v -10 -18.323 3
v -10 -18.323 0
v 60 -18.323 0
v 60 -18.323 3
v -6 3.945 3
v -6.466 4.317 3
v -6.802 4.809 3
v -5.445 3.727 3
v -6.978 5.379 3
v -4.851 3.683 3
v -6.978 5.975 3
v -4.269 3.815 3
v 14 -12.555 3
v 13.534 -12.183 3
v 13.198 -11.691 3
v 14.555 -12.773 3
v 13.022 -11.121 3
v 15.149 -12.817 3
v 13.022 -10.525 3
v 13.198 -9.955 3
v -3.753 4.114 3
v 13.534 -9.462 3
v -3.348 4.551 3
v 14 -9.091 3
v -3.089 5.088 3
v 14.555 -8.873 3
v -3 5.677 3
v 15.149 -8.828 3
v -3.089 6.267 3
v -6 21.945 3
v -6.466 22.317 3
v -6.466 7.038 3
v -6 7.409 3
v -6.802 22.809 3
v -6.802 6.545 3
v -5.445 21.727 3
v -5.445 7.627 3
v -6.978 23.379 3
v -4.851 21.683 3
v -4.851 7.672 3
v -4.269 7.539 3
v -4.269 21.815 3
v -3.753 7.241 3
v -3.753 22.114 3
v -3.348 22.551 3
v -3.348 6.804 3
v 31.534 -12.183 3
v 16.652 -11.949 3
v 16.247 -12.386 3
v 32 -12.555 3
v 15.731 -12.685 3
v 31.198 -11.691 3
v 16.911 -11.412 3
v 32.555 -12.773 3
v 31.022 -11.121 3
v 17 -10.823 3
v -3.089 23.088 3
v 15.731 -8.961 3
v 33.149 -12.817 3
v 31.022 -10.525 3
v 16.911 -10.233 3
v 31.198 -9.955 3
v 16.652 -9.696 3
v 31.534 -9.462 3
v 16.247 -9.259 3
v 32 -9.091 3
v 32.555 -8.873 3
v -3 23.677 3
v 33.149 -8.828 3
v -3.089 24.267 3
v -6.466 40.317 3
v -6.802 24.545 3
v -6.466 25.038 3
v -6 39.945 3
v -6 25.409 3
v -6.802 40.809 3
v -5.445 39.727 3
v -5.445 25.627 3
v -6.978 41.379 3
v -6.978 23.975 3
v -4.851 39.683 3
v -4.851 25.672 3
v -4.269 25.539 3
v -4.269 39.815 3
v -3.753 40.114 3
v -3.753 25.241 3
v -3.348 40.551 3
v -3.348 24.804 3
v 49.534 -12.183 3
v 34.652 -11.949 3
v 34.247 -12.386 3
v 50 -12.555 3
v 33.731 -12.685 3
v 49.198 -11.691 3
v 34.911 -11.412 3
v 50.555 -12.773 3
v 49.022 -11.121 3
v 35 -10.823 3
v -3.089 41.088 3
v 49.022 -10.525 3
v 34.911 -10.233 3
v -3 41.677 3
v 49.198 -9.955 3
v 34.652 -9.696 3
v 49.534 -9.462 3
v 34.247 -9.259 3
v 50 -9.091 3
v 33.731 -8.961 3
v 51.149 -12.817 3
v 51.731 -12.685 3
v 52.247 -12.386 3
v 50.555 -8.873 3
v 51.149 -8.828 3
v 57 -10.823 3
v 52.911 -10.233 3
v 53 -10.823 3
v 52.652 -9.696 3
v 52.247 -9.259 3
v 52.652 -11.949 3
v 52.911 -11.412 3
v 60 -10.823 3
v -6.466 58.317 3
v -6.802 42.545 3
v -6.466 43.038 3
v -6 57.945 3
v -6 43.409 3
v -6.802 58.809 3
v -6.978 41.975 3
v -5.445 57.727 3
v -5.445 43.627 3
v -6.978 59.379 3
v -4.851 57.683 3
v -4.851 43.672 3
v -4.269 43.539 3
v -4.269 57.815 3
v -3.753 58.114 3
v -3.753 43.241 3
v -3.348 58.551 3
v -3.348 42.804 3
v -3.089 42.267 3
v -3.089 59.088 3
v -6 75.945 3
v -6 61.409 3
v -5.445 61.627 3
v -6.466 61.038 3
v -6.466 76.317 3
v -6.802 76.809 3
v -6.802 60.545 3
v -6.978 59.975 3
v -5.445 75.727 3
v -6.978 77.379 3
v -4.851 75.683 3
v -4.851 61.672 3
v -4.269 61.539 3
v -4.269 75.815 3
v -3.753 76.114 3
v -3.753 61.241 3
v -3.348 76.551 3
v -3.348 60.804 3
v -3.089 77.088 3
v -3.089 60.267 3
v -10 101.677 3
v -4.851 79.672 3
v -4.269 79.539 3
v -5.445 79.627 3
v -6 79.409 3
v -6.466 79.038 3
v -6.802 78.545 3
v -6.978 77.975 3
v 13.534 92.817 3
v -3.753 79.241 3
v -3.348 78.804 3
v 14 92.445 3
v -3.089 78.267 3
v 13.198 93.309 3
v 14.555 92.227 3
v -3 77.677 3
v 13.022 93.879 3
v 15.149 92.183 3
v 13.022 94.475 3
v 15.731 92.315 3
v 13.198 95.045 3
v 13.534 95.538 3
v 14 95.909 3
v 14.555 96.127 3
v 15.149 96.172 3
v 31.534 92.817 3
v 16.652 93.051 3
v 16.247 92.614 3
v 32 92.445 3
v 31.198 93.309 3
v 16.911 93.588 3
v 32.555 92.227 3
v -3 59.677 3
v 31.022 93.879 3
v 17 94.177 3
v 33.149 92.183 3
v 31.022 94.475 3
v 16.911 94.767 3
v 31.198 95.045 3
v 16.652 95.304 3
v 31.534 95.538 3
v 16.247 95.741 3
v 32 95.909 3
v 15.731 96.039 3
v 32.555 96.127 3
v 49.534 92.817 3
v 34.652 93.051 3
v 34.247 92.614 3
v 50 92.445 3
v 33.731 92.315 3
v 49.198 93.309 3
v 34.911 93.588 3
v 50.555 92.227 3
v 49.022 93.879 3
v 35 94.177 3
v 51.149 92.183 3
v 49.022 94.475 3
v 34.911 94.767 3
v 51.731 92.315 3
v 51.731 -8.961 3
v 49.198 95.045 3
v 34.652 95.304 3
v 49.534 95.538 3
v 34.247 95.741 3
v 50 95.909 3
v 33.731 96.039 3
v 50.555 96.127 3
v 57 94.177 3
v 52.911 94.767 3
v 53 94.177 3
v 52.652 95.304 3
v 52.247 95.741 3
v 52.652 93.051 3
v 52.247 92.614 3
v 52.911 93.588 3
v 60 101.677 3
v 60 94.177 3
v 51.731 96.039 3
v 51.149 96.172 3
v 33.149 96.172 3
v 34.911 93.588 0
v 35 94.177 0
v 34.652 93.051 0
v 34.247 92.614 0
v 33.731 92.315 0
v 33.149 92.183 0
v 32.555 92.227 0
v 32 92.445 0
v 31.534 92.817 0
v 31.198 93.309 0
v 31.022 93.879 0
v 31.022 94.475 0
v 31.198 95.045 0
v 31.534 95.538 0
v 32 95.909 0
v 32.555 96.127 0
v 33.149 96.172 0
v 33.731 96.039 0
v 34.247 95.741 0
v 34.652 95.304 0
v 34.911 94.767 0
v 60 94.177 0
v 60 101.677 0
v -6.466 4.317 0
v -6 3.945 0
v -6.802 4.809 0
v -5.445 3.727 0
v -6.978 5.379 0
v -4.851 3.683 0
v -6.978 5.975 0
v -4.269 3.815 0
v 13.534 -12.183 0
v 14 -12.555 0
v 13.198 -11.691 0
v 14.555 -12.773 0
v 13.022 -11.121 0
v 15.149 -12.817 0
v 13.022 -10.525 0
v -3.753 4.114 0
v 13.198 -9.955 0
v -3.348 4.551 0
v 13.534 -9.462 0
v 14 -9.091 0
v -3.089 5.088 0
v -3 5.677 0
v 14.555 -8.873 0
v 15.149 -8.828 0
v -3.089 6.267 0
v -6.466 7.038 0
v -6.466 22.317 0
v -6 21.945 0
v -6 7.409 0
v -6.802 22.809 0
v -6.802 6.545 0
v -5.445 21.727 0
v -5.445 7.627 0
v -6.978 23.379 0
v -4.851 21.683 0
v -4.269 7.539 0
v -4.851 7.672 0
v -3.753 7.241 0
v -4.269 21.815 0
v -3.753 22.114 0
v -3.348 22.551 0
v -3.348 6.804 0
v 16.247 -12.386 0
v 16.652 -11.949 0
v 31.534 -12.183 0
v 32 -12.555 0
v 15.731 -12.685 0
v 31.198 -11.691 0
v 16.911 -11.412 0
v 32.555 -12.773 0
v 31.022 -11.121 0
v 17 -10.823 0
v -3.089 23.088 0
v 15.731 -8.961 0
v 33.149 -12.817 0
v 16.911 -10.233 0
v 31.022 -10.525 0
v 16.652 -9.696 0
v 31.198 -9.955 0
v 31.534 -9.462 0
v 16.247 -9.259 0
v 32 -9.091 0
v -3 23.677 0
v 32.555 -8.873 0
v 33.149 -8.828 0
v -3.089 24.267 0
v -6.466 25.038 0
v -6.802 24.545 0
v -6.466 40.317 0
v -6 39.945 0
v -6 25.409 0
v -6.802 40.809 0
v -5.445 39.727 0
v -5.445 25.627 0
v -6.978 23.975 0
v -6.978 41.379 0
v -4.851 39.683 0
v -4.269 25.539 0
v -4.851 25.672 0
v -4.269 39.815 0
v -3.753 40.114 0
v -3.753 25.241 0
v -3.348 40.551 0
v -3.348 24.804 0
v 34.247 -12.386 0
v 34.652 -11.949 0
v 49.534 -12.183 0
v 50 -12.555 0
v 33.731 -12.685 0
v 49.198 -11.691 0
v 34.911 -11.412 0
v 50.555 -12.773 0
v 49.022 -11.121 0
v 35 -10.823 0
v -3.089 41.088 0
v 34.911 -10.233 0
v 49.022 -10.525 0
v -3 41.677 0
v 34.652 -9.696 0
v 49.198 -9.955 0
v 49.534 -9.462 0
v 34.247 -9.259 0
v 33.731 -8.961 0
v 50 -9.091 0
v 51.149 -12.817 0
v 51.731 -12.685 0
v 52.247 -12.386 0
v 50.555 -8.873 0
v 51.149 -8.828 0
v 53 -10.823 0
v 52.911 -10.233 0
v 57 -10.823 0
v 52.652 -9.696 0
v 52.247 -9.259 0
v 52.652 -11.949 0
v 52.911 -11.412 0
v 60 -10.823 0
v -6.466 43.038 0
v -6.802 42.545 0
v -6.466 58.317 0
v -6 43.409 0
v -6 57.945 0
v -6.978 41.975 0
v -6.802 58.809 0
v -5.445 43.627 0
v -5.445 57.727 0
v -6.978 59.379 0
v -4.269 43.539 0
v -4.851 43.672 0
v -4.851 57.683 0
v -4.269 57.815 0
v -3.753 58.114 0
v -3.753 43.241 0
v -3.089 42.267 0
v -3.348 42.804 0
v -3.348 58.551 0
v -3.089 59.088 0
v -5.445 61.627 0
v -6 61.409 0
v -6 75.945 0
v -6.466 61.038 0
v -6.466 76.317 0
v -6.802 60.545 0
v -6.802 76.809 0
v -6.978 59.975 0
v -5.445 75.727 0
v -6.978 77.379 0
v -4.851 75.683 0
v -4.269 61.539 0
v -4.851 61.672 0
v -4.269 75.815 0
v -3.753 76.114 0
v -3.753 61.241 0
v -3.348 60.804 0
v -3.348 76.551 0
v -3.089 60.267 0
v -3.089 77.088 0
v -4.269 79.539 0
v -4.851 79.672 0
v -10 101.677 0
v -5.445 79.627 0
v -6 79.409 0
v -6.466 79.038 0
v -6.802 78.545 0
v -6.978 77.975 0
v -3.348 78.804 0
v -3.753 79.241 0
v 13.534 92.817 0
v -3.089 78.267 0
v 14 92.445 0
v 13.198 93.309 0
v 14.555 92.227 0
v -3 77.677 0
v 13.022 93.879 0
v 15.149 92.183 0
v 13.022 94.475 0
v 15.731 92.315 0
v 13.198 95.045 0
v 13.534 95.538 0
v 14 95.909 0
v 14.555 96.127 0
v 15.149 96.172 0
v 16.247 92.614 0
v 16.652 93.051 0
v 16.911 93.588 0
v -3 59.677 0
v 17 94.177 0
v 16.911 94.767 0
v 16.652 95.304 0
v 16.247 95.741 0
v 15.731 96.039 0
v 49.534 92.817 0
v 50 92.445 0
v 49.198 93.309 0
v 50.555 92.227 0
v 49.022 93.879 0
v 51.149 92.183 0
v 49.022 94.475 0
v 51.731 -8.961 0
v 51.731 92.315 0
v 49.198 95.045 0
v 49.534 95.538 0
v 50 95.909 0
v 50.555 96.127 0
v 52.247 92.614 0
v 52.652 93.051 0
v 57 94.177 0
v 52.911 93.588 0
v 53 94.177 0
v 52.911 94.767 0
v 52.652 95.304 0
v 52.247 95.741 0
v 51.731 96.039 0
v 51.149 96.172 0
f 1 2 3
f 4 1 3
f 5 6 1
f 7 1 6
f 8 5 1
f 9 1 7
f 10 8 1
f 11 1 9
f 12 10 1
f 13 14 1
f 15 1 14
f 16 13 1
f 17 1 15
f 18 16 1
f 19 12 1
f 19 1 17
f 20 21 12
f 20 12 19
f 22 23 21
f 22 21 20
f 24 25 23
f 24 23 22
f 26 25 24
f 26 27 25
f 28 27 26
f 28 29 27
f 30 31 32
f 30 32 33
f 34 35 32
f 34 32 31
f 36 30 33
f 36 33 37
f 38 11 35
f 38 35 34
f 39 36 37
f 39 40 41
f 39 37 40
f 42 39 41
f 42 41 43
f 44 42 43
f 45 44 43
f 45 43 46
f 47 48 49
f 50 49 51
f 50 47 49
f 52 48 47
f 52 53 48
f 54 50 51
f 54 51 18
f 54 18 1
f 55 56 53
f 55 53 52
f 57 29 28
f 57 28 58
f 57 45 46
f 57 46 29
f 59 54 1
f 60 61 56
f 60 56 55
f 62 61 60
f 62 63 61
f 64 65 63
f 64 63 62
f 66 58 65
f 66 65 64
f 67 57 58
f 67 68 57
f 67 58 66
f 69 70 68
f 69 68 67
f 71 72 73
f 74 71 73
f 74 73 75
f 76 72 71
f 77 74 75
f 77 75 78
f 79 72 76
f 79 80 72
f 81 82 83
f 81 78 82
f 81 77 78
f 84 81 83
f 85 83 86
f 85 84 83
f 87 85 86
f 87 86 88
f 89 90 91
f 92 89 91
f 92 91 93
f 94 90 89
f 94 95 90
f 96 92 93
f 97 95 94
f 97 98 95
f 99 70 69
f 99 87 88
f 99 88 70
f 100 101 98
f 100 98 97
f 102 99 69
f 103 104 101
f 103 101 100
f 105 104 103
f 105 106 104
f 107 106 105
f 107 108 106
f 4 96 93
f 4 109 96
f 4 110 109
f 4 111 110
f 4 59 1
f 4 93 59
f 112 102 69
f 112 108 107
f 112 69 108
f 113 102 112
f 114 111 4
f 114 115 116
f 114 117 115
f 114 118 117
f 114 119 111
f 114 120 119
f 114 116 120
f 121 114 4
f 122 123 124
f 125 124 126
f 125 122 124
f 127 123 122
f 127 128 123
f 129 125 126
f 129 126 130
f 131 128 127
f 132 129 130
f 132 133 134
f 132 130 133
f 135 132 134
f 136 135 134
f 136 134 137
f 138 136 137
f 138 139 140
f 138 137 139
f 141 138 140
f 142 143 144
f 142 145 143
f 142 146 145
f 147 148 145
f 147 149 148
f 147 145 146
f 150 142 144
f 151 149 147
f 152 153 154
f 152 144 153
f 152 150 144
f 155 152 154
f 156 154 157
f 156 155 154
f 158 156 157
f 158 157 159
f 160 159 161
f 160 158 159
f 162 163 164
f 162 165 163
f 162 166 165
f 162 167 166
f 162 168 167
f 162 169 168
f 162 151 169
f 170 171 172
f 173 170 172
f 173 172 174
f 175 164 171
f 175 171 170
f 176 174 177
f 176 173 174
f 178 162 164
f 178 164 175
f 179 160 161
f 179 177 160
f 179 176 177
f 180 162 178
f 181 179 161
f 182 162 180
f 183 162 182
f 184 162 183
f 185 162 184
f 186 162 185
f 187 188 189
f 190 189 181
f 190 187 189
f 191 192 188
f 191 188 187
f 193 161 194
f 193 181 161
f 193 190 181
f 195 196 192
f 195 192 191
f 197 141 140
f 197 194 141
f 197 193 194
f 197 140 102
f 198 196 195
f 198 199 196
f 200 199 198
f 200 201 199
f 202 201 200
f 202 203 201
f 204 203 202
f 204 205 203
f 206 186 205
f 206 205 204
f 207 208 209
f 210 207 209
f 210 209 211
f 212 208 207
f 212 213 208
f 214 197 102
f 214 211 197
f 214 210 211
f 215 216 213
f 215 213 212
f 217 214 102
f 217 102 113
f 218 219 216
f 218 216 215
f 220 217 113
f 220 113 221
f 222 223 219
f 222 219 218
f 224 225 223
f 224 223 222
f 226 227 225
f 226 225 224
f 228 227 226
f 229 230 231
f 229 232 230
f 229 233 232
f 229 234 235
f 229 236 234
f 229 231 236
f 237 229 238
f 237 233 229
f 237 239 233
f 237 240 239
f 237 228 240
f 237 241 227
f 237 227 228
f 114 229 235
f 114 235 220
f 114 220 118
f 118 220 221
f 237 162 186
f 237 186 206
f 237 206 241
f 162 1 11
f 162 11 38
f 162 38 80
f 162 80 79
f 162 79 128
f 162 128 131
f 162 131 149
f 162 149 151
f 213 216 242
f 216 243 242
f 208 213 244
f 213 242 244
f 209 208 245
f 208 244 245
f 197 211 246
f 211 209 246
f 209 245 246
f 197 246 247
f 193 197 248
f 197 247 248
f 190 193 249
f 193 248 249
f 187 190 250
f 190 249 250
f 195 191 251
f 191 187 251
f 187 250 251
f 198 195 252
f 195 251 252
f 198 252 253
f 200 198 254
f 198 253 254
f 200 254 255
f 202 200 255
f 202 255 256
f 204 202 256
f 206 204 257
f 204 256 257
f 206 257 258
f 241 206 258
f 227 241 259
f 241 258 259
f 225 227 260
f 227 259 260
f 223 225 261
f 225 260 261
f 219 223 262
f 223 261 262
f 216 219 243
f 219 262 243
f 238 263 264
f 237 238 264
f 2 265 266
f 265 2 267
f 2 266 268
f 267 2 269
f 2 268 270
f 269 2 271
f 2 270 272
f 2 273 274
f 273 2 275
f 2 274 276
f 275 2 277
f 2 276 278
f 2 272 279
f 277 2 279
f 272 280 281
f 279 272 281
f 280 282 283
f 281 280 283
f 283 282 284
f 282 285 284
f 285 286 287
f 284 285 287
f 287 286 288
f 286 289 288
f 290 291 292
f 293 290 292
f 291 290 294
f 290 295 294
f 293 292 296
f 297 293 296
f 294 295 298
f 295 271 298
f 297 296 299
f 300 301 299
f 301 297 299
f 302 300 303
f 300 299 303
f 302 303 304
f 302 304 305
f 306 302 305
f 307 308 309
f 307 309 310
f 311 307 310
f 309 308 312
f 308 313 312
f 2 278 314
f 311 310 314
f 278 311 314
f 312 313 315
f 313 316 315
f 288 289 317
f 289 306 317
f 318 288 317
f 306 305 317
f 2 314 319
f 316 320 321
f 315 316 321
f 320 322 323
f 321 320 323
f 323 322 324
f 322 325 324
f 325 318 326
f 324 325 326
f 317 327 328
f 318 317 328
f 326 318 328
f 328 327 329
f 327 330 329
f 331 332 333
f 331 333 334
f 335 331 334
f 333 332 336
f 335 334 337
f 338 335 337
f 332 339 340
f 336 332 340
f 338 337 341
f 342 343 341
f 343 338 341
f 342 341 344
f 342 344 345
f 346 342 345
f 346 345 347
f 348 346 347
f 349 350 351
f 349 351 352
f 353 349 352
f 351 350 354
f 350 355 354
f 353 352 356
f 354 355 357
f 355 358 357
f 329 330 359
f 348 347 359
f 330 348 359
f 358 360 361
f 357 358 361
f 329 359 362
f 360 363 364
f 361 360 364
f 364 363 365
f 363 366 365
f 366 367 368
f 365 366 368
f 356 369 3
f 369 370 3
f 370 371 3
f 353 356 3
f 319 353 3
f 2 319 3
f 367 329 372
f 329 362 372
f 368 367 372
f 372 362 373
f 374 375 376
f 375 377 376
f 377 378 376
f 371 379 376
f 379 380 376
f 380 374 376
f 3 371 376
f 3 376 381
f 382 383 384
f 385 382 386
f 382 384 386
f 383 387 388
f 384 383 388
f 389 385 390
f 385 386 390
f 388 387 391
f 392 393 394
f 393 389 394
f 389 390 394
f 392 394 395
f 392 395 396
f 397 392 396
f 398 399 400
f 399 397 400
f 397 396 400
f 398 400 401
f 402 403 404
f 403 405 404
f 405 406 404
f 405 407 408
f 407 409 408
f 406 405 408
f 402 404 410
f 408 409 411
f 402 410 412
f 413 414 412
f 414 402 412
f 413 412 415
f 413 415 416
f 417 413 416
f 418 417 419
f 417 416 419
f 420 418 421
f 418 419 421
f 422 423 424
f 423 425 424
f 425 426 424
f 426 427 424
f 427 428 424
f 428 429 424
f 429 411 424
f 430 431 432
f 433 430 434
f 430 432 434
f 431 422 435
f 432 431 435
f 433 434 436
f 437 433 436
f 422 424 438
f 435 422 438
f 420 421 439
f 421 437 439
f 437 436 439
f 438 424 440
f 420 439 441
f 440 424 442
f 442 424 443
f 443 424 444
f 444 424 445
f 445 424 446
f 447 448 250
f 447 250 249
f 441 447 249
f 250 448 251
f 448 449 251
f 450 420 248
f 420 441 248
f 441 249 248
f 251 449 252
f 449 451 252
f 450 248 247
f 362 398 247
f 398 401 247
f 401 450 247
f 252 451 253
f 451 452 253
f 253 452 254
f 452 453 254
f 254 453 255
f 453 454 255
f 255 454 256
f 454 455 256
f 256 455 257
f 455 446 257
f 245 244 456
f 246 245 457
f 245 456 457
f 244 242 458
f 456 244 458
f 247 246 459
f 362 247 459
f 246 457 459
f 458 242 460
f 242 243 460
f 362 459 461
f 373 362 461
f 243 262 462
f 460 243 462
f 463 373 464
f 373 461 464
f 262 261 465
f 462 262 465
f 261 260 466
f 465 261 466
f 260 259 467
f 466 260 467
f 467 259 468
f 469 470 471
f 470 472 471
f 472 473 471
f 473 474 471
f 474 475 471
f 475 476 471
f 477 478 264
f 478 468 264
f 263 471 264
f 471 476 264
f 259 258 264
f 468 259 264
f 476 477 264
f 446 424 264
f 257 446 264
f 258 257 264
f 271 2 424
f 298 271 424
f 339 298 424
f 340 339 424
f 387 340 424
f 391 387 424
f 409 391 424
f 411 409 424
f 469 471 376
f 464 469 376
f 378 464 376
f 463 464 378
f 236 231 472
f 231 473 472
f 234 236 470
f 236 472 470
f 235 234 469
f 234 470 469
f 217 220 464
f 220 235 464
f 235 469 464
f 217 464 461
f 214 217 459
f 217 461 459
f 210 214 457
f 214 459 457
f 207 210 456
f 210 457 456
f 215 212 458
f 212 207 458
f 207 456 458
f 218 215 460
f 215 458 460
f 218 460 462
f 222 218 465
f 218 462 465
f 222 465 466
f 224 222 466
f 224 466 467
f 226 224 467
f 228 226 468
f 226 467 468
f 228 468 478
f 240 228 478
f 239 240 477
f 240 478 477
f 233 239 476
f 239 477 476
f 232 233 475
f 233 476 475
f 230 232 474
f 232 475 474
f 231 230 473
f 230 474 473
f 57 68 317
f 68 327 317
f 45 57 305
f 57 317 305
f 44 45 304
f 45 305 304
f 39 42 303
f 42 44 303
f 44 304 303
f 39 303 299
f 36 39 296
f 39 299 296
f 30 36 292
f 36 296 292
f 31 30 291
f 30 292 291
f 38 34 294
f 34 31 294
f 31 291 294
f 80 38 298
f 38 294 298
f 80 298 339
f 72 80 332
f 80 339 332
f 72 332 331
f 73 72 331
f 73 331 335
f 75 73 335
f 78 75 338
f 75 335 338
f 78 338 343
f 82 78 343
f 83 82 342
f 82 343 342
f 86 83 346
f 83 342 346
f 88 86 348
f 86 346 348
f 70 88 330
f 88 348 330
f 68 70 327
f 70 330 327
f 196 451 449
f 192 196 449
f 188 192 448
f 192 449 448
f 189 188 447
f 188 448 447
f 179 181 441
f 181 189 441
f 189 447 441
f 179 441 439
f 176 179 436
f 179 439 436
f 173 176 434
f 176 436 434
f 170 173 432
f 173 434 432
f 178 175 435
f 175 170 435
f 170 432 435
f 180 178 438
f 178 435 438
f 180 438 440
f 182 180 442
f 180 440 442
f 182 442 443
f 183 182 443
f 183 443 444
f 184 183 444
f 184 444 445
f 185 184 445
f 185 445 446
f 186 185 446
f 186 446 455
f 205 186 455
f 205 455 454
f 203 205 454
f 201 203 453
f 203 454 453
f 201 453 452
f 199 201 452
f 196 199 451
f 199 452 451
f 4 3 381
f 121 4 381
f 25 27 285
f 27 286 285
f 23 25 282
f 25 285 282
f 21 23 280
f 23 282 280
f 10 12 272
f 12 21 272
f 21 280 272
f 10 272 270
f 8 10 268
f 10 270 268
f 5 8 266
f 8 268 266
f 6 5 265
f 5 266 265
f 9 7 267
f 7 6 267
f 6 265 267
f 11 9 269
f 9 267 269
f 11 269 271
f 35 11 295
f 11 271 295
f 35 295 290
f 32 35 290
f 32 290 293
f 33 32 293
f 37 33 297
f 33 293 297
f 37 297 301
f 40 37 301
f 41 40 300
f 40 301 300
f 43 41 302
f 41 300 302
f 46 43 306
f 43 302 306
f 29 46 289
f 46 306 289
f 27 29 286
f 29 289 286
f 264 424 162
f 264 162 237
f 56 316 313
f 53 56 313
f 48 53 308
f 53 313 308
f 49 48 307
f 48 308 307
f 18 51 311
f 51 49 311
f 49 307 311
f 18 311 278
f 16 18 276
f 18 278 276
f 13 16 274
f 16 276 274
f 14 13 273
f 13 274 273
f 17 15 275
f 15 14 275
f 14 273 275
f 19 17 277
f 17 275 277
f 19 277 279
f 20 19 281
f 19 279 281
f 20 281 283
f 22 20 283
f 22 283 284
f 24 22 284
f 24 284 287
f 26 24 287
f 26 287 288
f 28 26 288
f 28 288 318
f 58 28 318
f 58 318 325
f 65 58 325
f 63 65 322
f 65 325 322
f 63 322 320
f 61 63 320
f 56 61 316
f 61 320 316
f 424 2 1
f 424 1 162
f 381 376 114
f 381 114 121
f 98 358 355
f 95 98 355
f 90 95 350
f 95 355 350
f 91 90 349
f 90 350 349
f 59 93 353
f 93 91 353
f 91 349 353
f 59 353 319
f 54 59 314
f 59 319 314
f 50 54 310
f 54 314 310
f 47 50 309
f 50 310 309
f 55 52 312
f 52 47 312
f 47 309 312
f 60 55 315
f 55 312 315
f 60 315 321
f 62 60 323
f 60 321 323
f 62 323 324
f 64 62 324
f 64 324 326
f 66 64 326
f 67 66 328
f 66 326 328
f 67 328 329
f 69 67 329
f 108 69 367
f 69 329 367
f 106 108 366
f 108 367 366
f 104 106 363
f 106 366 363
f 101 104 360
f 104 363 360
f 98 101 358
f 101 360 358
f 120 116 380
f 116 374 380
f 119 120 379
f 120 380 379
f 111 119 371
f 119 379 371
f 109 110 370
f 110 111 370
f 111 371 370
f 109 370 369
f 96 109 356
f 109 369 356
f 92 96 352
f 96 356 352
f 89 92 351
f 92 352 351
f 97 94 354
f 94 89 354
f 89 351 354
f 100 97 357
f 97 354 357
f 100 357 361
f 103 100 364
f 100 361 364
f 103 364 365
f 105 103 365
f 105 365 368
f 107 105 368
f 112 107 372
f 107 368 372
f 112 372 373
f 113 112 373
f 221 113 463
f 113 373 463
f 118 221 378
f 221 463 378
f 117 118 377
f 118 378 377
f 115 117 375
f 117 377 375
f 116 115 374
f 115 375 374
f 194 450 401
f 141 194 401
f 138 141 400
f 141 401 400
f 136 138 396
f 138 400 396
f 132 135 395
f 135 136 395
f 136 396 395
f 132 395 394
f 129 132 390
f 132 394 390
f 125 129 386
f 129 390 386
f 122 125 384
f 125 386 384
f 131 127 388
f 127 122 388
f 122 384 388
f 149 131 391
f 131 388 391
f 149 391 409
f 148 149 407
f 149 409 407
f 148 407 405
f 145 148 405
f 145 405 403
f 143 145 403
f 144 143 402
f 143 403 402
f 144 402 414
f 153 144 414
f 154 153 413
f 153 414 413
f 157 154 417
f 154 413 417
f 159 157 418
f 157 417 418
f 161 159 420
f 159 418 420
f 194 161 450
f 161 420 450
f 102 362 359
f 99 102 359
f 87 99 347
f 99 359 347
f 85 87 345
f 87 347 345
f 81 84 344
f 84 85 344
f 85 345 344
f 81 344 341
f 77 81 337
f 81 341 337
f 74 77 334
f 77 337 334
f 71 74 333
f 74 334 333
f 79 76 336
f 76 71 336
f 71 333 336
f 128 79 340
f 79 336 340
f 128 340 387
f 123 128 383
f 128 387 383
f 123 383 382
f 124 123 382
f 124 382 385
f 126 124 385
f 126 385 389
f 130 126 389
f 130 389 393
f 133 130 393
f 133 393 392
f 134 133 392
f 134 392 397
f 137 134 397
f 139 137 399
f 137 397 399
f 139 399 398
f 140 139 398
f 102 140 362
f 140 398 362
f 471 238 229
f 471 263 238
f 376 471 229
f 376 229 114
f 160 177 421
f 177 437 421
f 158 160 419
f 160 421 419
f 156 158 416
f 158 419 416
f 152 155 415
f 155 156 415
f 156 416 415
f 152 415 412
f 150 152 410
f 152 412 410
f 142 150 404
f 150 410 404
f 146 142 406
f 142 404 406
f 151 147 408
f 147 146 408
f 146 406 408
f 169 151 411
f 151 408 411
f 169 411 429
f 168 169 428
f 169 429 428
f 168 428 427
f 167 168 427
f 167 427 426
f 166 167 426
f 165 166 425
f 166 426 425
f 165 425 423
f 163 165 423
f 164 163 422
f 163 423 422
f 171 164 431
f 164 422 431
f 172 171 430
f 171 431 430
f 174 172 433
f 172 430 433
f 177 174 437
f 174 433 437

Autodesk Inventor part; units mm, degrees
ref_plane "YZ Plane" through (0, 0, 0) normal (1, 0, 0) x (0, 1, 0)
ref_plane "XZ Plane" through (0, 0, 0) normal (0, 1, 0) x (-1, 0, 0)
ref_plane "XY Plane" through (0, 0, 0) normal (0, 0, 1) x (1, 0, 0)
sketch "Sketch3" plane through (0, 0, 0) normal (0, 0, 1) x (1, 0, 0)
  circle A0 centre (51, -10.8228) radius 2 projected
  circle A1 centre (33, -10.8228) radius 2 projected
  circle A2 centre (15, -10.8228) radius 2 projected
  line L0 (0, -18.3228) -> (60, -18.3228) projected
  line L1 (0, -18.3228) -> (0, -13.3228) projected
  line L2 (10, -13.3228) -> (0, -13.3228) projected
  line L3 (10, -3.3228) -> (10, -13.3228) projected
  line L4 (10, -3.3228) -> (57, -3.3228) projected
  line L5 (60, -18.3228) -> (60, -10.8228) projected
  circle A3 centre (-5, 77.6772) radius 2 projected
  circle A4 centre (-5, 59.6772) radius 2 projected
  circle A5 centre (-5, 23.6772) radius 2 projected
  circle A6 centre (-5, 5.6772) radius 2 projected
  circle A7 centre (-5, 41.6772) radius 2 projected
  line L6 (-10, -18.3228) -> (-10, 101.6772) projected
  line L7 (-10, 101.6772) -> (0, 101.6772) projected
  line L8 (0, 96.6772) -> (0, 101.6772) projected
  line L9 (0, 96.6772) -> (10, 96.6772) projected
  line L10 (10, -13.3228) -> (10, 96.6772) projected
  line L11 (0, -13.3228) -> (10, -13.3228) projected
  line L12 (0, -18.3228) -> (0, -13.3228) projected
  line L13 (-10, -18.3228) -> (0, -18.3228) projected
  circle A8 centre (51, 94.1772) radius 2 projected
  circle A9 centre (33, 94.1772) radius 2 projected
  circle A10 centre (15, 94.1772) radius 2 projected
  line L14 (0, 101.6772) -> (60, 101.6772) projected
  line L15 (60, 94.1772) -> (60, 101.6772) projected
  line L16 (10, 86.6772) -> (57, 86.6772) projected
  line L17 (10, 96.6772) -> (10, 86.6772) projected
  line L18 (0, 96.6772) -> (10, 96.6772) projected
  line L19 (0, 101.6772) -> (0, 96.6772) projected
  line L20 (57, -10.8228) -> (60, -10.8228) projected
  line L21 (57, -3.3228) -> (57, -10.8228) projected
  line L22 (60, 94.1772) -> (57, 94.1772) projected
  line L23 (57, 94.1772) -> (57, 86.6772) projected
  line L24 (57, 86.6772) -> (57, -4.2516)
  point P0 (0, 0)
extrude "Extrusion2" add sketch "Sketch3" along normal blind 3
properties part number "КВ33.000.103 - Стенка тонкая"
